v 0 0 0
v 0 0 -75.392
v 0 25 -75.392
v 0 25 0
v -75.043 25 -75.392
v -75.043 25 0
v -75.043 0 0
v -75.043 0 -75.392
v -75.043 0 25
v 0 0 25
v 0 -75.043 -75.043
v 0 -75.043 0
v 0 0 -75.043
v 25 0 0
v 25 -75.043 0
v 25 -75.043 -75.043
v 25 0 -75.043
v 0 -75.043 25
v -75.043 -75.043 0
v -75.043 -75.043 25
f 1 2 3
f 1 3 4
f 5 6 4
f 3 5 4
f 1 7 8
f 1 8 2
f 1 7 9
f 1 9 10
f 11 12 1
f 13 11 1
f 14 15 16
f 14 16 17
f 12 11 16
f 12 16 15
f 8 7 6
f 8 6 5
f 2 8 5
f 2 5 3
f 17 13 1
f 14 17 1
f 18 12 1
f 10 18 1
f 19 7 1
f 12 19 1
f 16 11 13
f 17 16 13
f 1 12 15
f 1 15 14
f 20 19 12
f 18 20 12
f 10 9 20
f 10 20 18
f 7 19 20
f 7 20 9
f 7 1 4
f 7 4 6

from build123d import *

# Parameters (mm, degrees)
F3_DEPTH = 25
F1_W     = 75.043403
F1_H     = 75.043403
F4_DEPTH = 25
F0_W     = 75.043403
F0_H     = 75.043403
F5_DEPTH = 25


with BuildPart() as f3:
    # F2 (on Front) → F3 (new body)
    with BuildSketch(Plane.XZ):
        Polygon((0, -75.043403), (0, 0), (-75.042592, 0), (-75.042592, -75.392112), (0, -75.392112), align=None)
    extrude(amount=-F3_DEPTH)


with BuildPart() as f4:
    # F1 (on Right) → F4 (new body)
    with BuildSketch(Plane.YZ):
        with Locations((-37.521701, -37.521701)):
            Rectangle(F1_W, F1_H)
    extrude(amount=F4_DEPTH)


with BuildPart() as f5:
    # F0 (on Top) → F5 (new body)
    with BuildSketch(Plane.XY):
        with Locations((-37.521701, -37.521701)):
            Rectangle(F0_W, F0_H)
    extrude(amount=F5_DEPTH)


solid = Compound([f3.part, f4.part, f5.part])
